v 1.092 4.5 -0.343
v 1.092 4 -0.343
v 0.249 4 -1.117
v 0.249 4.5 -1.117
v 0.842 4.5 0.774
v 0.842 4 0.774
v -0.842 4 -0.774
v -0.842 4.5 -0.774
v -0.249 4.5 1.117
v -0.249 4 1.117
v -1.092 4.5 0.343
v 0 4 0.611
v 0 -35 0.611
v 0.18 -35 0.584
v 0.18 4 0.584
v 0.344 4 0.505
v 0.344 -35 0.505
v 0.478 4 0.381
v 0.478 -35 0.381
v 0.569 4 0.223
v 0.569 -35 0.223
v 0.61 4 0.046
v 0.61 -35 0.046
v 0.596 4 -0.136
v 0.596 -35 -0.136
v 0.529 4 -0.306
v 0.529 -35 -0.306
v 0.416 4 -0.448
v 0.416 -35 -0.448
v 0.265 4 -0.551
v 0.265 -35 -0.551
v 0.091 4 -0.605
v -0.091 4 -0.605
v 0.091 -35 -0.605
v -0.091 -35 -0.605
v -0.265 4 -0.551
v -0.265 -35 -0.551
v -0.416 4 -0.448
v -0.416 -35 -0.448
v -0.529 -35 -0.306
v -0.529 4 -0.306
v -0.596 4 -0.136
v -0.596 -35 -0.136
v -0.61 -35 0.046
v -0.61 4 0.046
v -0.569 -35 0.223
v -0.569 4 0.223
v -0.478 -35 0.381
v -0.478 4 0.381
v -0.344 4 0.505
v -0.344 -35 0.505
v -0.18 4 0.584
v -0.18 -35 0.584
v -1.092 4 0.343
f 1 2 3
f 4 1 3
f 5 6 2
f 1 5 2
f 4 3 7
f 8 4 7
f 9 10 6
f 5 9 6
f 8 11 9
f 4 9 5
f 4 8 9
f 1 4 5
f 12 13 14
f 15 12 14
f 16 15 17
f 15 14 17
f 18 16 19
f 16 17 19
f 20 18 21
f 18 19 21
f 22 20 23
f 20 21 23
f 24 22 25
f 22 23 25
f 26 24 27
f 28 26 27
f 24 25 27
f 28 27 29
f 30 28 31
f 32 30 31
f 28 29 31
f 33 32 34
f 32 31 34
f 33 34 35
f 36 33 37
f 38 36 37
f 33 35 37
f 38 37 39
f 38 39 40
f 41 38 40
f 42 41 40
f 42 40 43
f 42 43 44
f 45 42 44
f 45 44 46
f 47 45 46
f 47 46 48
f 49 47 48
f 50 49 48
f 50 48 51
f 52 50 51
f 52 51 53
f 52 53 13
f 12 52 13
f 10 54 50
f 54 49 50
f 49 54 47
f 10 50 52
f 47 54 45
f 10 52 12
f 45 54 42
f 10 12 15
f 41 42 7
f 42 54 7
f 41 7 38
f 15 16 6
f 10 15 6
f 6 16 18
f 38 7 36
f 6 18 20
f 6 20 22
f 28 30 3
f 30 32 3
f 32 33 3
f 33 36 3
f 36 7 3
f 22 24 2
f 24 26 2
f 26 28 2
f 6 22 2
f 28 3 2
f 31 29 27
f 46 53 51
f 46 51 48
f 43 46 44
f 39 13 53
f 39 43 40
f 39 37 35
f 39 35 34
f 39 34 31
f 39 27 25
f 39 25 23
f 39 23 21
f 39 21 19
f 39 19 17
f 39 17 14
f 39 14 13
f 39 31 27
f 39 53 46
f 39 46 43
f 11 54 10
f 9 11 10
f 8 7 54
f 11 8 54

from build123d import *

# Parameters (mm, degrees)
BOSS_EXTRUDE3_DEPTH      = 4
BOSS_EXTRUDE3_DEPTH_BACK = 50
SKETCH2_R                = 0.611392816
BOSS_EXTRUDE4_DEPTH      = 0.5
SKETCH4_W                = 4.000836521
SKETCH4_H                = 3.633574568
CUT_EXTRUDE1_DEPTH       = 15


with BuildPart() as part:
    # Sketch2 → Boss-Extrude3 (new, two sides: drawn at the far end of the back side and taken through both)
    with BuildSketch(Plane(origin=(0, 0, 0), x_dir=(1, 0, 0), z_dir=(0, 1, 0)).offset(-BOSS_EXTRUDE3_DEPTH_BACK)):
        with Locations(Location((0, 0, 0), (0, 0, 270))):
            Circle(SKETCH2_R)
    extrude(amount=BOSS_EXTRUDE3_DEPTH + BOSS_EXTRUDE3_DEPTH_BACK)

    # Sketch3 → Boss-Extrude4 (add)
    with BuildSketch(Plane(origin=(0, 4, 0), x_dir=(1, 0, 0), z_dir=(0, 1, 0))):
        Polygon((0.842464754, -0.774154905), (1.091670191, 0.342518427), (0.249205437, 1.116673331), (-0.842464754, 0.774154905), (-1.091670191, -0.342518427), (-0.249205437, -1.116673331), align=None)
    extrude(amount=BOSS_EXTRUDE4_DEPTH)

    # Sketch4 → Cut-Extrude1 (cut)
    with BuildSketch(Plane(origin=(0, -50, 0), x_dir=(-1, 0, 0), z_dir=(0, -1, 0))):
        with Locations((-0.863813315, -0.094243853)):
            Rectangle(SKETCH4_W, SKETCH4_H)
    extrude(amount=-CUT_EXTRUDE1_DEPTH, mode=Mode.SUBTRACT)


solid = part.part
